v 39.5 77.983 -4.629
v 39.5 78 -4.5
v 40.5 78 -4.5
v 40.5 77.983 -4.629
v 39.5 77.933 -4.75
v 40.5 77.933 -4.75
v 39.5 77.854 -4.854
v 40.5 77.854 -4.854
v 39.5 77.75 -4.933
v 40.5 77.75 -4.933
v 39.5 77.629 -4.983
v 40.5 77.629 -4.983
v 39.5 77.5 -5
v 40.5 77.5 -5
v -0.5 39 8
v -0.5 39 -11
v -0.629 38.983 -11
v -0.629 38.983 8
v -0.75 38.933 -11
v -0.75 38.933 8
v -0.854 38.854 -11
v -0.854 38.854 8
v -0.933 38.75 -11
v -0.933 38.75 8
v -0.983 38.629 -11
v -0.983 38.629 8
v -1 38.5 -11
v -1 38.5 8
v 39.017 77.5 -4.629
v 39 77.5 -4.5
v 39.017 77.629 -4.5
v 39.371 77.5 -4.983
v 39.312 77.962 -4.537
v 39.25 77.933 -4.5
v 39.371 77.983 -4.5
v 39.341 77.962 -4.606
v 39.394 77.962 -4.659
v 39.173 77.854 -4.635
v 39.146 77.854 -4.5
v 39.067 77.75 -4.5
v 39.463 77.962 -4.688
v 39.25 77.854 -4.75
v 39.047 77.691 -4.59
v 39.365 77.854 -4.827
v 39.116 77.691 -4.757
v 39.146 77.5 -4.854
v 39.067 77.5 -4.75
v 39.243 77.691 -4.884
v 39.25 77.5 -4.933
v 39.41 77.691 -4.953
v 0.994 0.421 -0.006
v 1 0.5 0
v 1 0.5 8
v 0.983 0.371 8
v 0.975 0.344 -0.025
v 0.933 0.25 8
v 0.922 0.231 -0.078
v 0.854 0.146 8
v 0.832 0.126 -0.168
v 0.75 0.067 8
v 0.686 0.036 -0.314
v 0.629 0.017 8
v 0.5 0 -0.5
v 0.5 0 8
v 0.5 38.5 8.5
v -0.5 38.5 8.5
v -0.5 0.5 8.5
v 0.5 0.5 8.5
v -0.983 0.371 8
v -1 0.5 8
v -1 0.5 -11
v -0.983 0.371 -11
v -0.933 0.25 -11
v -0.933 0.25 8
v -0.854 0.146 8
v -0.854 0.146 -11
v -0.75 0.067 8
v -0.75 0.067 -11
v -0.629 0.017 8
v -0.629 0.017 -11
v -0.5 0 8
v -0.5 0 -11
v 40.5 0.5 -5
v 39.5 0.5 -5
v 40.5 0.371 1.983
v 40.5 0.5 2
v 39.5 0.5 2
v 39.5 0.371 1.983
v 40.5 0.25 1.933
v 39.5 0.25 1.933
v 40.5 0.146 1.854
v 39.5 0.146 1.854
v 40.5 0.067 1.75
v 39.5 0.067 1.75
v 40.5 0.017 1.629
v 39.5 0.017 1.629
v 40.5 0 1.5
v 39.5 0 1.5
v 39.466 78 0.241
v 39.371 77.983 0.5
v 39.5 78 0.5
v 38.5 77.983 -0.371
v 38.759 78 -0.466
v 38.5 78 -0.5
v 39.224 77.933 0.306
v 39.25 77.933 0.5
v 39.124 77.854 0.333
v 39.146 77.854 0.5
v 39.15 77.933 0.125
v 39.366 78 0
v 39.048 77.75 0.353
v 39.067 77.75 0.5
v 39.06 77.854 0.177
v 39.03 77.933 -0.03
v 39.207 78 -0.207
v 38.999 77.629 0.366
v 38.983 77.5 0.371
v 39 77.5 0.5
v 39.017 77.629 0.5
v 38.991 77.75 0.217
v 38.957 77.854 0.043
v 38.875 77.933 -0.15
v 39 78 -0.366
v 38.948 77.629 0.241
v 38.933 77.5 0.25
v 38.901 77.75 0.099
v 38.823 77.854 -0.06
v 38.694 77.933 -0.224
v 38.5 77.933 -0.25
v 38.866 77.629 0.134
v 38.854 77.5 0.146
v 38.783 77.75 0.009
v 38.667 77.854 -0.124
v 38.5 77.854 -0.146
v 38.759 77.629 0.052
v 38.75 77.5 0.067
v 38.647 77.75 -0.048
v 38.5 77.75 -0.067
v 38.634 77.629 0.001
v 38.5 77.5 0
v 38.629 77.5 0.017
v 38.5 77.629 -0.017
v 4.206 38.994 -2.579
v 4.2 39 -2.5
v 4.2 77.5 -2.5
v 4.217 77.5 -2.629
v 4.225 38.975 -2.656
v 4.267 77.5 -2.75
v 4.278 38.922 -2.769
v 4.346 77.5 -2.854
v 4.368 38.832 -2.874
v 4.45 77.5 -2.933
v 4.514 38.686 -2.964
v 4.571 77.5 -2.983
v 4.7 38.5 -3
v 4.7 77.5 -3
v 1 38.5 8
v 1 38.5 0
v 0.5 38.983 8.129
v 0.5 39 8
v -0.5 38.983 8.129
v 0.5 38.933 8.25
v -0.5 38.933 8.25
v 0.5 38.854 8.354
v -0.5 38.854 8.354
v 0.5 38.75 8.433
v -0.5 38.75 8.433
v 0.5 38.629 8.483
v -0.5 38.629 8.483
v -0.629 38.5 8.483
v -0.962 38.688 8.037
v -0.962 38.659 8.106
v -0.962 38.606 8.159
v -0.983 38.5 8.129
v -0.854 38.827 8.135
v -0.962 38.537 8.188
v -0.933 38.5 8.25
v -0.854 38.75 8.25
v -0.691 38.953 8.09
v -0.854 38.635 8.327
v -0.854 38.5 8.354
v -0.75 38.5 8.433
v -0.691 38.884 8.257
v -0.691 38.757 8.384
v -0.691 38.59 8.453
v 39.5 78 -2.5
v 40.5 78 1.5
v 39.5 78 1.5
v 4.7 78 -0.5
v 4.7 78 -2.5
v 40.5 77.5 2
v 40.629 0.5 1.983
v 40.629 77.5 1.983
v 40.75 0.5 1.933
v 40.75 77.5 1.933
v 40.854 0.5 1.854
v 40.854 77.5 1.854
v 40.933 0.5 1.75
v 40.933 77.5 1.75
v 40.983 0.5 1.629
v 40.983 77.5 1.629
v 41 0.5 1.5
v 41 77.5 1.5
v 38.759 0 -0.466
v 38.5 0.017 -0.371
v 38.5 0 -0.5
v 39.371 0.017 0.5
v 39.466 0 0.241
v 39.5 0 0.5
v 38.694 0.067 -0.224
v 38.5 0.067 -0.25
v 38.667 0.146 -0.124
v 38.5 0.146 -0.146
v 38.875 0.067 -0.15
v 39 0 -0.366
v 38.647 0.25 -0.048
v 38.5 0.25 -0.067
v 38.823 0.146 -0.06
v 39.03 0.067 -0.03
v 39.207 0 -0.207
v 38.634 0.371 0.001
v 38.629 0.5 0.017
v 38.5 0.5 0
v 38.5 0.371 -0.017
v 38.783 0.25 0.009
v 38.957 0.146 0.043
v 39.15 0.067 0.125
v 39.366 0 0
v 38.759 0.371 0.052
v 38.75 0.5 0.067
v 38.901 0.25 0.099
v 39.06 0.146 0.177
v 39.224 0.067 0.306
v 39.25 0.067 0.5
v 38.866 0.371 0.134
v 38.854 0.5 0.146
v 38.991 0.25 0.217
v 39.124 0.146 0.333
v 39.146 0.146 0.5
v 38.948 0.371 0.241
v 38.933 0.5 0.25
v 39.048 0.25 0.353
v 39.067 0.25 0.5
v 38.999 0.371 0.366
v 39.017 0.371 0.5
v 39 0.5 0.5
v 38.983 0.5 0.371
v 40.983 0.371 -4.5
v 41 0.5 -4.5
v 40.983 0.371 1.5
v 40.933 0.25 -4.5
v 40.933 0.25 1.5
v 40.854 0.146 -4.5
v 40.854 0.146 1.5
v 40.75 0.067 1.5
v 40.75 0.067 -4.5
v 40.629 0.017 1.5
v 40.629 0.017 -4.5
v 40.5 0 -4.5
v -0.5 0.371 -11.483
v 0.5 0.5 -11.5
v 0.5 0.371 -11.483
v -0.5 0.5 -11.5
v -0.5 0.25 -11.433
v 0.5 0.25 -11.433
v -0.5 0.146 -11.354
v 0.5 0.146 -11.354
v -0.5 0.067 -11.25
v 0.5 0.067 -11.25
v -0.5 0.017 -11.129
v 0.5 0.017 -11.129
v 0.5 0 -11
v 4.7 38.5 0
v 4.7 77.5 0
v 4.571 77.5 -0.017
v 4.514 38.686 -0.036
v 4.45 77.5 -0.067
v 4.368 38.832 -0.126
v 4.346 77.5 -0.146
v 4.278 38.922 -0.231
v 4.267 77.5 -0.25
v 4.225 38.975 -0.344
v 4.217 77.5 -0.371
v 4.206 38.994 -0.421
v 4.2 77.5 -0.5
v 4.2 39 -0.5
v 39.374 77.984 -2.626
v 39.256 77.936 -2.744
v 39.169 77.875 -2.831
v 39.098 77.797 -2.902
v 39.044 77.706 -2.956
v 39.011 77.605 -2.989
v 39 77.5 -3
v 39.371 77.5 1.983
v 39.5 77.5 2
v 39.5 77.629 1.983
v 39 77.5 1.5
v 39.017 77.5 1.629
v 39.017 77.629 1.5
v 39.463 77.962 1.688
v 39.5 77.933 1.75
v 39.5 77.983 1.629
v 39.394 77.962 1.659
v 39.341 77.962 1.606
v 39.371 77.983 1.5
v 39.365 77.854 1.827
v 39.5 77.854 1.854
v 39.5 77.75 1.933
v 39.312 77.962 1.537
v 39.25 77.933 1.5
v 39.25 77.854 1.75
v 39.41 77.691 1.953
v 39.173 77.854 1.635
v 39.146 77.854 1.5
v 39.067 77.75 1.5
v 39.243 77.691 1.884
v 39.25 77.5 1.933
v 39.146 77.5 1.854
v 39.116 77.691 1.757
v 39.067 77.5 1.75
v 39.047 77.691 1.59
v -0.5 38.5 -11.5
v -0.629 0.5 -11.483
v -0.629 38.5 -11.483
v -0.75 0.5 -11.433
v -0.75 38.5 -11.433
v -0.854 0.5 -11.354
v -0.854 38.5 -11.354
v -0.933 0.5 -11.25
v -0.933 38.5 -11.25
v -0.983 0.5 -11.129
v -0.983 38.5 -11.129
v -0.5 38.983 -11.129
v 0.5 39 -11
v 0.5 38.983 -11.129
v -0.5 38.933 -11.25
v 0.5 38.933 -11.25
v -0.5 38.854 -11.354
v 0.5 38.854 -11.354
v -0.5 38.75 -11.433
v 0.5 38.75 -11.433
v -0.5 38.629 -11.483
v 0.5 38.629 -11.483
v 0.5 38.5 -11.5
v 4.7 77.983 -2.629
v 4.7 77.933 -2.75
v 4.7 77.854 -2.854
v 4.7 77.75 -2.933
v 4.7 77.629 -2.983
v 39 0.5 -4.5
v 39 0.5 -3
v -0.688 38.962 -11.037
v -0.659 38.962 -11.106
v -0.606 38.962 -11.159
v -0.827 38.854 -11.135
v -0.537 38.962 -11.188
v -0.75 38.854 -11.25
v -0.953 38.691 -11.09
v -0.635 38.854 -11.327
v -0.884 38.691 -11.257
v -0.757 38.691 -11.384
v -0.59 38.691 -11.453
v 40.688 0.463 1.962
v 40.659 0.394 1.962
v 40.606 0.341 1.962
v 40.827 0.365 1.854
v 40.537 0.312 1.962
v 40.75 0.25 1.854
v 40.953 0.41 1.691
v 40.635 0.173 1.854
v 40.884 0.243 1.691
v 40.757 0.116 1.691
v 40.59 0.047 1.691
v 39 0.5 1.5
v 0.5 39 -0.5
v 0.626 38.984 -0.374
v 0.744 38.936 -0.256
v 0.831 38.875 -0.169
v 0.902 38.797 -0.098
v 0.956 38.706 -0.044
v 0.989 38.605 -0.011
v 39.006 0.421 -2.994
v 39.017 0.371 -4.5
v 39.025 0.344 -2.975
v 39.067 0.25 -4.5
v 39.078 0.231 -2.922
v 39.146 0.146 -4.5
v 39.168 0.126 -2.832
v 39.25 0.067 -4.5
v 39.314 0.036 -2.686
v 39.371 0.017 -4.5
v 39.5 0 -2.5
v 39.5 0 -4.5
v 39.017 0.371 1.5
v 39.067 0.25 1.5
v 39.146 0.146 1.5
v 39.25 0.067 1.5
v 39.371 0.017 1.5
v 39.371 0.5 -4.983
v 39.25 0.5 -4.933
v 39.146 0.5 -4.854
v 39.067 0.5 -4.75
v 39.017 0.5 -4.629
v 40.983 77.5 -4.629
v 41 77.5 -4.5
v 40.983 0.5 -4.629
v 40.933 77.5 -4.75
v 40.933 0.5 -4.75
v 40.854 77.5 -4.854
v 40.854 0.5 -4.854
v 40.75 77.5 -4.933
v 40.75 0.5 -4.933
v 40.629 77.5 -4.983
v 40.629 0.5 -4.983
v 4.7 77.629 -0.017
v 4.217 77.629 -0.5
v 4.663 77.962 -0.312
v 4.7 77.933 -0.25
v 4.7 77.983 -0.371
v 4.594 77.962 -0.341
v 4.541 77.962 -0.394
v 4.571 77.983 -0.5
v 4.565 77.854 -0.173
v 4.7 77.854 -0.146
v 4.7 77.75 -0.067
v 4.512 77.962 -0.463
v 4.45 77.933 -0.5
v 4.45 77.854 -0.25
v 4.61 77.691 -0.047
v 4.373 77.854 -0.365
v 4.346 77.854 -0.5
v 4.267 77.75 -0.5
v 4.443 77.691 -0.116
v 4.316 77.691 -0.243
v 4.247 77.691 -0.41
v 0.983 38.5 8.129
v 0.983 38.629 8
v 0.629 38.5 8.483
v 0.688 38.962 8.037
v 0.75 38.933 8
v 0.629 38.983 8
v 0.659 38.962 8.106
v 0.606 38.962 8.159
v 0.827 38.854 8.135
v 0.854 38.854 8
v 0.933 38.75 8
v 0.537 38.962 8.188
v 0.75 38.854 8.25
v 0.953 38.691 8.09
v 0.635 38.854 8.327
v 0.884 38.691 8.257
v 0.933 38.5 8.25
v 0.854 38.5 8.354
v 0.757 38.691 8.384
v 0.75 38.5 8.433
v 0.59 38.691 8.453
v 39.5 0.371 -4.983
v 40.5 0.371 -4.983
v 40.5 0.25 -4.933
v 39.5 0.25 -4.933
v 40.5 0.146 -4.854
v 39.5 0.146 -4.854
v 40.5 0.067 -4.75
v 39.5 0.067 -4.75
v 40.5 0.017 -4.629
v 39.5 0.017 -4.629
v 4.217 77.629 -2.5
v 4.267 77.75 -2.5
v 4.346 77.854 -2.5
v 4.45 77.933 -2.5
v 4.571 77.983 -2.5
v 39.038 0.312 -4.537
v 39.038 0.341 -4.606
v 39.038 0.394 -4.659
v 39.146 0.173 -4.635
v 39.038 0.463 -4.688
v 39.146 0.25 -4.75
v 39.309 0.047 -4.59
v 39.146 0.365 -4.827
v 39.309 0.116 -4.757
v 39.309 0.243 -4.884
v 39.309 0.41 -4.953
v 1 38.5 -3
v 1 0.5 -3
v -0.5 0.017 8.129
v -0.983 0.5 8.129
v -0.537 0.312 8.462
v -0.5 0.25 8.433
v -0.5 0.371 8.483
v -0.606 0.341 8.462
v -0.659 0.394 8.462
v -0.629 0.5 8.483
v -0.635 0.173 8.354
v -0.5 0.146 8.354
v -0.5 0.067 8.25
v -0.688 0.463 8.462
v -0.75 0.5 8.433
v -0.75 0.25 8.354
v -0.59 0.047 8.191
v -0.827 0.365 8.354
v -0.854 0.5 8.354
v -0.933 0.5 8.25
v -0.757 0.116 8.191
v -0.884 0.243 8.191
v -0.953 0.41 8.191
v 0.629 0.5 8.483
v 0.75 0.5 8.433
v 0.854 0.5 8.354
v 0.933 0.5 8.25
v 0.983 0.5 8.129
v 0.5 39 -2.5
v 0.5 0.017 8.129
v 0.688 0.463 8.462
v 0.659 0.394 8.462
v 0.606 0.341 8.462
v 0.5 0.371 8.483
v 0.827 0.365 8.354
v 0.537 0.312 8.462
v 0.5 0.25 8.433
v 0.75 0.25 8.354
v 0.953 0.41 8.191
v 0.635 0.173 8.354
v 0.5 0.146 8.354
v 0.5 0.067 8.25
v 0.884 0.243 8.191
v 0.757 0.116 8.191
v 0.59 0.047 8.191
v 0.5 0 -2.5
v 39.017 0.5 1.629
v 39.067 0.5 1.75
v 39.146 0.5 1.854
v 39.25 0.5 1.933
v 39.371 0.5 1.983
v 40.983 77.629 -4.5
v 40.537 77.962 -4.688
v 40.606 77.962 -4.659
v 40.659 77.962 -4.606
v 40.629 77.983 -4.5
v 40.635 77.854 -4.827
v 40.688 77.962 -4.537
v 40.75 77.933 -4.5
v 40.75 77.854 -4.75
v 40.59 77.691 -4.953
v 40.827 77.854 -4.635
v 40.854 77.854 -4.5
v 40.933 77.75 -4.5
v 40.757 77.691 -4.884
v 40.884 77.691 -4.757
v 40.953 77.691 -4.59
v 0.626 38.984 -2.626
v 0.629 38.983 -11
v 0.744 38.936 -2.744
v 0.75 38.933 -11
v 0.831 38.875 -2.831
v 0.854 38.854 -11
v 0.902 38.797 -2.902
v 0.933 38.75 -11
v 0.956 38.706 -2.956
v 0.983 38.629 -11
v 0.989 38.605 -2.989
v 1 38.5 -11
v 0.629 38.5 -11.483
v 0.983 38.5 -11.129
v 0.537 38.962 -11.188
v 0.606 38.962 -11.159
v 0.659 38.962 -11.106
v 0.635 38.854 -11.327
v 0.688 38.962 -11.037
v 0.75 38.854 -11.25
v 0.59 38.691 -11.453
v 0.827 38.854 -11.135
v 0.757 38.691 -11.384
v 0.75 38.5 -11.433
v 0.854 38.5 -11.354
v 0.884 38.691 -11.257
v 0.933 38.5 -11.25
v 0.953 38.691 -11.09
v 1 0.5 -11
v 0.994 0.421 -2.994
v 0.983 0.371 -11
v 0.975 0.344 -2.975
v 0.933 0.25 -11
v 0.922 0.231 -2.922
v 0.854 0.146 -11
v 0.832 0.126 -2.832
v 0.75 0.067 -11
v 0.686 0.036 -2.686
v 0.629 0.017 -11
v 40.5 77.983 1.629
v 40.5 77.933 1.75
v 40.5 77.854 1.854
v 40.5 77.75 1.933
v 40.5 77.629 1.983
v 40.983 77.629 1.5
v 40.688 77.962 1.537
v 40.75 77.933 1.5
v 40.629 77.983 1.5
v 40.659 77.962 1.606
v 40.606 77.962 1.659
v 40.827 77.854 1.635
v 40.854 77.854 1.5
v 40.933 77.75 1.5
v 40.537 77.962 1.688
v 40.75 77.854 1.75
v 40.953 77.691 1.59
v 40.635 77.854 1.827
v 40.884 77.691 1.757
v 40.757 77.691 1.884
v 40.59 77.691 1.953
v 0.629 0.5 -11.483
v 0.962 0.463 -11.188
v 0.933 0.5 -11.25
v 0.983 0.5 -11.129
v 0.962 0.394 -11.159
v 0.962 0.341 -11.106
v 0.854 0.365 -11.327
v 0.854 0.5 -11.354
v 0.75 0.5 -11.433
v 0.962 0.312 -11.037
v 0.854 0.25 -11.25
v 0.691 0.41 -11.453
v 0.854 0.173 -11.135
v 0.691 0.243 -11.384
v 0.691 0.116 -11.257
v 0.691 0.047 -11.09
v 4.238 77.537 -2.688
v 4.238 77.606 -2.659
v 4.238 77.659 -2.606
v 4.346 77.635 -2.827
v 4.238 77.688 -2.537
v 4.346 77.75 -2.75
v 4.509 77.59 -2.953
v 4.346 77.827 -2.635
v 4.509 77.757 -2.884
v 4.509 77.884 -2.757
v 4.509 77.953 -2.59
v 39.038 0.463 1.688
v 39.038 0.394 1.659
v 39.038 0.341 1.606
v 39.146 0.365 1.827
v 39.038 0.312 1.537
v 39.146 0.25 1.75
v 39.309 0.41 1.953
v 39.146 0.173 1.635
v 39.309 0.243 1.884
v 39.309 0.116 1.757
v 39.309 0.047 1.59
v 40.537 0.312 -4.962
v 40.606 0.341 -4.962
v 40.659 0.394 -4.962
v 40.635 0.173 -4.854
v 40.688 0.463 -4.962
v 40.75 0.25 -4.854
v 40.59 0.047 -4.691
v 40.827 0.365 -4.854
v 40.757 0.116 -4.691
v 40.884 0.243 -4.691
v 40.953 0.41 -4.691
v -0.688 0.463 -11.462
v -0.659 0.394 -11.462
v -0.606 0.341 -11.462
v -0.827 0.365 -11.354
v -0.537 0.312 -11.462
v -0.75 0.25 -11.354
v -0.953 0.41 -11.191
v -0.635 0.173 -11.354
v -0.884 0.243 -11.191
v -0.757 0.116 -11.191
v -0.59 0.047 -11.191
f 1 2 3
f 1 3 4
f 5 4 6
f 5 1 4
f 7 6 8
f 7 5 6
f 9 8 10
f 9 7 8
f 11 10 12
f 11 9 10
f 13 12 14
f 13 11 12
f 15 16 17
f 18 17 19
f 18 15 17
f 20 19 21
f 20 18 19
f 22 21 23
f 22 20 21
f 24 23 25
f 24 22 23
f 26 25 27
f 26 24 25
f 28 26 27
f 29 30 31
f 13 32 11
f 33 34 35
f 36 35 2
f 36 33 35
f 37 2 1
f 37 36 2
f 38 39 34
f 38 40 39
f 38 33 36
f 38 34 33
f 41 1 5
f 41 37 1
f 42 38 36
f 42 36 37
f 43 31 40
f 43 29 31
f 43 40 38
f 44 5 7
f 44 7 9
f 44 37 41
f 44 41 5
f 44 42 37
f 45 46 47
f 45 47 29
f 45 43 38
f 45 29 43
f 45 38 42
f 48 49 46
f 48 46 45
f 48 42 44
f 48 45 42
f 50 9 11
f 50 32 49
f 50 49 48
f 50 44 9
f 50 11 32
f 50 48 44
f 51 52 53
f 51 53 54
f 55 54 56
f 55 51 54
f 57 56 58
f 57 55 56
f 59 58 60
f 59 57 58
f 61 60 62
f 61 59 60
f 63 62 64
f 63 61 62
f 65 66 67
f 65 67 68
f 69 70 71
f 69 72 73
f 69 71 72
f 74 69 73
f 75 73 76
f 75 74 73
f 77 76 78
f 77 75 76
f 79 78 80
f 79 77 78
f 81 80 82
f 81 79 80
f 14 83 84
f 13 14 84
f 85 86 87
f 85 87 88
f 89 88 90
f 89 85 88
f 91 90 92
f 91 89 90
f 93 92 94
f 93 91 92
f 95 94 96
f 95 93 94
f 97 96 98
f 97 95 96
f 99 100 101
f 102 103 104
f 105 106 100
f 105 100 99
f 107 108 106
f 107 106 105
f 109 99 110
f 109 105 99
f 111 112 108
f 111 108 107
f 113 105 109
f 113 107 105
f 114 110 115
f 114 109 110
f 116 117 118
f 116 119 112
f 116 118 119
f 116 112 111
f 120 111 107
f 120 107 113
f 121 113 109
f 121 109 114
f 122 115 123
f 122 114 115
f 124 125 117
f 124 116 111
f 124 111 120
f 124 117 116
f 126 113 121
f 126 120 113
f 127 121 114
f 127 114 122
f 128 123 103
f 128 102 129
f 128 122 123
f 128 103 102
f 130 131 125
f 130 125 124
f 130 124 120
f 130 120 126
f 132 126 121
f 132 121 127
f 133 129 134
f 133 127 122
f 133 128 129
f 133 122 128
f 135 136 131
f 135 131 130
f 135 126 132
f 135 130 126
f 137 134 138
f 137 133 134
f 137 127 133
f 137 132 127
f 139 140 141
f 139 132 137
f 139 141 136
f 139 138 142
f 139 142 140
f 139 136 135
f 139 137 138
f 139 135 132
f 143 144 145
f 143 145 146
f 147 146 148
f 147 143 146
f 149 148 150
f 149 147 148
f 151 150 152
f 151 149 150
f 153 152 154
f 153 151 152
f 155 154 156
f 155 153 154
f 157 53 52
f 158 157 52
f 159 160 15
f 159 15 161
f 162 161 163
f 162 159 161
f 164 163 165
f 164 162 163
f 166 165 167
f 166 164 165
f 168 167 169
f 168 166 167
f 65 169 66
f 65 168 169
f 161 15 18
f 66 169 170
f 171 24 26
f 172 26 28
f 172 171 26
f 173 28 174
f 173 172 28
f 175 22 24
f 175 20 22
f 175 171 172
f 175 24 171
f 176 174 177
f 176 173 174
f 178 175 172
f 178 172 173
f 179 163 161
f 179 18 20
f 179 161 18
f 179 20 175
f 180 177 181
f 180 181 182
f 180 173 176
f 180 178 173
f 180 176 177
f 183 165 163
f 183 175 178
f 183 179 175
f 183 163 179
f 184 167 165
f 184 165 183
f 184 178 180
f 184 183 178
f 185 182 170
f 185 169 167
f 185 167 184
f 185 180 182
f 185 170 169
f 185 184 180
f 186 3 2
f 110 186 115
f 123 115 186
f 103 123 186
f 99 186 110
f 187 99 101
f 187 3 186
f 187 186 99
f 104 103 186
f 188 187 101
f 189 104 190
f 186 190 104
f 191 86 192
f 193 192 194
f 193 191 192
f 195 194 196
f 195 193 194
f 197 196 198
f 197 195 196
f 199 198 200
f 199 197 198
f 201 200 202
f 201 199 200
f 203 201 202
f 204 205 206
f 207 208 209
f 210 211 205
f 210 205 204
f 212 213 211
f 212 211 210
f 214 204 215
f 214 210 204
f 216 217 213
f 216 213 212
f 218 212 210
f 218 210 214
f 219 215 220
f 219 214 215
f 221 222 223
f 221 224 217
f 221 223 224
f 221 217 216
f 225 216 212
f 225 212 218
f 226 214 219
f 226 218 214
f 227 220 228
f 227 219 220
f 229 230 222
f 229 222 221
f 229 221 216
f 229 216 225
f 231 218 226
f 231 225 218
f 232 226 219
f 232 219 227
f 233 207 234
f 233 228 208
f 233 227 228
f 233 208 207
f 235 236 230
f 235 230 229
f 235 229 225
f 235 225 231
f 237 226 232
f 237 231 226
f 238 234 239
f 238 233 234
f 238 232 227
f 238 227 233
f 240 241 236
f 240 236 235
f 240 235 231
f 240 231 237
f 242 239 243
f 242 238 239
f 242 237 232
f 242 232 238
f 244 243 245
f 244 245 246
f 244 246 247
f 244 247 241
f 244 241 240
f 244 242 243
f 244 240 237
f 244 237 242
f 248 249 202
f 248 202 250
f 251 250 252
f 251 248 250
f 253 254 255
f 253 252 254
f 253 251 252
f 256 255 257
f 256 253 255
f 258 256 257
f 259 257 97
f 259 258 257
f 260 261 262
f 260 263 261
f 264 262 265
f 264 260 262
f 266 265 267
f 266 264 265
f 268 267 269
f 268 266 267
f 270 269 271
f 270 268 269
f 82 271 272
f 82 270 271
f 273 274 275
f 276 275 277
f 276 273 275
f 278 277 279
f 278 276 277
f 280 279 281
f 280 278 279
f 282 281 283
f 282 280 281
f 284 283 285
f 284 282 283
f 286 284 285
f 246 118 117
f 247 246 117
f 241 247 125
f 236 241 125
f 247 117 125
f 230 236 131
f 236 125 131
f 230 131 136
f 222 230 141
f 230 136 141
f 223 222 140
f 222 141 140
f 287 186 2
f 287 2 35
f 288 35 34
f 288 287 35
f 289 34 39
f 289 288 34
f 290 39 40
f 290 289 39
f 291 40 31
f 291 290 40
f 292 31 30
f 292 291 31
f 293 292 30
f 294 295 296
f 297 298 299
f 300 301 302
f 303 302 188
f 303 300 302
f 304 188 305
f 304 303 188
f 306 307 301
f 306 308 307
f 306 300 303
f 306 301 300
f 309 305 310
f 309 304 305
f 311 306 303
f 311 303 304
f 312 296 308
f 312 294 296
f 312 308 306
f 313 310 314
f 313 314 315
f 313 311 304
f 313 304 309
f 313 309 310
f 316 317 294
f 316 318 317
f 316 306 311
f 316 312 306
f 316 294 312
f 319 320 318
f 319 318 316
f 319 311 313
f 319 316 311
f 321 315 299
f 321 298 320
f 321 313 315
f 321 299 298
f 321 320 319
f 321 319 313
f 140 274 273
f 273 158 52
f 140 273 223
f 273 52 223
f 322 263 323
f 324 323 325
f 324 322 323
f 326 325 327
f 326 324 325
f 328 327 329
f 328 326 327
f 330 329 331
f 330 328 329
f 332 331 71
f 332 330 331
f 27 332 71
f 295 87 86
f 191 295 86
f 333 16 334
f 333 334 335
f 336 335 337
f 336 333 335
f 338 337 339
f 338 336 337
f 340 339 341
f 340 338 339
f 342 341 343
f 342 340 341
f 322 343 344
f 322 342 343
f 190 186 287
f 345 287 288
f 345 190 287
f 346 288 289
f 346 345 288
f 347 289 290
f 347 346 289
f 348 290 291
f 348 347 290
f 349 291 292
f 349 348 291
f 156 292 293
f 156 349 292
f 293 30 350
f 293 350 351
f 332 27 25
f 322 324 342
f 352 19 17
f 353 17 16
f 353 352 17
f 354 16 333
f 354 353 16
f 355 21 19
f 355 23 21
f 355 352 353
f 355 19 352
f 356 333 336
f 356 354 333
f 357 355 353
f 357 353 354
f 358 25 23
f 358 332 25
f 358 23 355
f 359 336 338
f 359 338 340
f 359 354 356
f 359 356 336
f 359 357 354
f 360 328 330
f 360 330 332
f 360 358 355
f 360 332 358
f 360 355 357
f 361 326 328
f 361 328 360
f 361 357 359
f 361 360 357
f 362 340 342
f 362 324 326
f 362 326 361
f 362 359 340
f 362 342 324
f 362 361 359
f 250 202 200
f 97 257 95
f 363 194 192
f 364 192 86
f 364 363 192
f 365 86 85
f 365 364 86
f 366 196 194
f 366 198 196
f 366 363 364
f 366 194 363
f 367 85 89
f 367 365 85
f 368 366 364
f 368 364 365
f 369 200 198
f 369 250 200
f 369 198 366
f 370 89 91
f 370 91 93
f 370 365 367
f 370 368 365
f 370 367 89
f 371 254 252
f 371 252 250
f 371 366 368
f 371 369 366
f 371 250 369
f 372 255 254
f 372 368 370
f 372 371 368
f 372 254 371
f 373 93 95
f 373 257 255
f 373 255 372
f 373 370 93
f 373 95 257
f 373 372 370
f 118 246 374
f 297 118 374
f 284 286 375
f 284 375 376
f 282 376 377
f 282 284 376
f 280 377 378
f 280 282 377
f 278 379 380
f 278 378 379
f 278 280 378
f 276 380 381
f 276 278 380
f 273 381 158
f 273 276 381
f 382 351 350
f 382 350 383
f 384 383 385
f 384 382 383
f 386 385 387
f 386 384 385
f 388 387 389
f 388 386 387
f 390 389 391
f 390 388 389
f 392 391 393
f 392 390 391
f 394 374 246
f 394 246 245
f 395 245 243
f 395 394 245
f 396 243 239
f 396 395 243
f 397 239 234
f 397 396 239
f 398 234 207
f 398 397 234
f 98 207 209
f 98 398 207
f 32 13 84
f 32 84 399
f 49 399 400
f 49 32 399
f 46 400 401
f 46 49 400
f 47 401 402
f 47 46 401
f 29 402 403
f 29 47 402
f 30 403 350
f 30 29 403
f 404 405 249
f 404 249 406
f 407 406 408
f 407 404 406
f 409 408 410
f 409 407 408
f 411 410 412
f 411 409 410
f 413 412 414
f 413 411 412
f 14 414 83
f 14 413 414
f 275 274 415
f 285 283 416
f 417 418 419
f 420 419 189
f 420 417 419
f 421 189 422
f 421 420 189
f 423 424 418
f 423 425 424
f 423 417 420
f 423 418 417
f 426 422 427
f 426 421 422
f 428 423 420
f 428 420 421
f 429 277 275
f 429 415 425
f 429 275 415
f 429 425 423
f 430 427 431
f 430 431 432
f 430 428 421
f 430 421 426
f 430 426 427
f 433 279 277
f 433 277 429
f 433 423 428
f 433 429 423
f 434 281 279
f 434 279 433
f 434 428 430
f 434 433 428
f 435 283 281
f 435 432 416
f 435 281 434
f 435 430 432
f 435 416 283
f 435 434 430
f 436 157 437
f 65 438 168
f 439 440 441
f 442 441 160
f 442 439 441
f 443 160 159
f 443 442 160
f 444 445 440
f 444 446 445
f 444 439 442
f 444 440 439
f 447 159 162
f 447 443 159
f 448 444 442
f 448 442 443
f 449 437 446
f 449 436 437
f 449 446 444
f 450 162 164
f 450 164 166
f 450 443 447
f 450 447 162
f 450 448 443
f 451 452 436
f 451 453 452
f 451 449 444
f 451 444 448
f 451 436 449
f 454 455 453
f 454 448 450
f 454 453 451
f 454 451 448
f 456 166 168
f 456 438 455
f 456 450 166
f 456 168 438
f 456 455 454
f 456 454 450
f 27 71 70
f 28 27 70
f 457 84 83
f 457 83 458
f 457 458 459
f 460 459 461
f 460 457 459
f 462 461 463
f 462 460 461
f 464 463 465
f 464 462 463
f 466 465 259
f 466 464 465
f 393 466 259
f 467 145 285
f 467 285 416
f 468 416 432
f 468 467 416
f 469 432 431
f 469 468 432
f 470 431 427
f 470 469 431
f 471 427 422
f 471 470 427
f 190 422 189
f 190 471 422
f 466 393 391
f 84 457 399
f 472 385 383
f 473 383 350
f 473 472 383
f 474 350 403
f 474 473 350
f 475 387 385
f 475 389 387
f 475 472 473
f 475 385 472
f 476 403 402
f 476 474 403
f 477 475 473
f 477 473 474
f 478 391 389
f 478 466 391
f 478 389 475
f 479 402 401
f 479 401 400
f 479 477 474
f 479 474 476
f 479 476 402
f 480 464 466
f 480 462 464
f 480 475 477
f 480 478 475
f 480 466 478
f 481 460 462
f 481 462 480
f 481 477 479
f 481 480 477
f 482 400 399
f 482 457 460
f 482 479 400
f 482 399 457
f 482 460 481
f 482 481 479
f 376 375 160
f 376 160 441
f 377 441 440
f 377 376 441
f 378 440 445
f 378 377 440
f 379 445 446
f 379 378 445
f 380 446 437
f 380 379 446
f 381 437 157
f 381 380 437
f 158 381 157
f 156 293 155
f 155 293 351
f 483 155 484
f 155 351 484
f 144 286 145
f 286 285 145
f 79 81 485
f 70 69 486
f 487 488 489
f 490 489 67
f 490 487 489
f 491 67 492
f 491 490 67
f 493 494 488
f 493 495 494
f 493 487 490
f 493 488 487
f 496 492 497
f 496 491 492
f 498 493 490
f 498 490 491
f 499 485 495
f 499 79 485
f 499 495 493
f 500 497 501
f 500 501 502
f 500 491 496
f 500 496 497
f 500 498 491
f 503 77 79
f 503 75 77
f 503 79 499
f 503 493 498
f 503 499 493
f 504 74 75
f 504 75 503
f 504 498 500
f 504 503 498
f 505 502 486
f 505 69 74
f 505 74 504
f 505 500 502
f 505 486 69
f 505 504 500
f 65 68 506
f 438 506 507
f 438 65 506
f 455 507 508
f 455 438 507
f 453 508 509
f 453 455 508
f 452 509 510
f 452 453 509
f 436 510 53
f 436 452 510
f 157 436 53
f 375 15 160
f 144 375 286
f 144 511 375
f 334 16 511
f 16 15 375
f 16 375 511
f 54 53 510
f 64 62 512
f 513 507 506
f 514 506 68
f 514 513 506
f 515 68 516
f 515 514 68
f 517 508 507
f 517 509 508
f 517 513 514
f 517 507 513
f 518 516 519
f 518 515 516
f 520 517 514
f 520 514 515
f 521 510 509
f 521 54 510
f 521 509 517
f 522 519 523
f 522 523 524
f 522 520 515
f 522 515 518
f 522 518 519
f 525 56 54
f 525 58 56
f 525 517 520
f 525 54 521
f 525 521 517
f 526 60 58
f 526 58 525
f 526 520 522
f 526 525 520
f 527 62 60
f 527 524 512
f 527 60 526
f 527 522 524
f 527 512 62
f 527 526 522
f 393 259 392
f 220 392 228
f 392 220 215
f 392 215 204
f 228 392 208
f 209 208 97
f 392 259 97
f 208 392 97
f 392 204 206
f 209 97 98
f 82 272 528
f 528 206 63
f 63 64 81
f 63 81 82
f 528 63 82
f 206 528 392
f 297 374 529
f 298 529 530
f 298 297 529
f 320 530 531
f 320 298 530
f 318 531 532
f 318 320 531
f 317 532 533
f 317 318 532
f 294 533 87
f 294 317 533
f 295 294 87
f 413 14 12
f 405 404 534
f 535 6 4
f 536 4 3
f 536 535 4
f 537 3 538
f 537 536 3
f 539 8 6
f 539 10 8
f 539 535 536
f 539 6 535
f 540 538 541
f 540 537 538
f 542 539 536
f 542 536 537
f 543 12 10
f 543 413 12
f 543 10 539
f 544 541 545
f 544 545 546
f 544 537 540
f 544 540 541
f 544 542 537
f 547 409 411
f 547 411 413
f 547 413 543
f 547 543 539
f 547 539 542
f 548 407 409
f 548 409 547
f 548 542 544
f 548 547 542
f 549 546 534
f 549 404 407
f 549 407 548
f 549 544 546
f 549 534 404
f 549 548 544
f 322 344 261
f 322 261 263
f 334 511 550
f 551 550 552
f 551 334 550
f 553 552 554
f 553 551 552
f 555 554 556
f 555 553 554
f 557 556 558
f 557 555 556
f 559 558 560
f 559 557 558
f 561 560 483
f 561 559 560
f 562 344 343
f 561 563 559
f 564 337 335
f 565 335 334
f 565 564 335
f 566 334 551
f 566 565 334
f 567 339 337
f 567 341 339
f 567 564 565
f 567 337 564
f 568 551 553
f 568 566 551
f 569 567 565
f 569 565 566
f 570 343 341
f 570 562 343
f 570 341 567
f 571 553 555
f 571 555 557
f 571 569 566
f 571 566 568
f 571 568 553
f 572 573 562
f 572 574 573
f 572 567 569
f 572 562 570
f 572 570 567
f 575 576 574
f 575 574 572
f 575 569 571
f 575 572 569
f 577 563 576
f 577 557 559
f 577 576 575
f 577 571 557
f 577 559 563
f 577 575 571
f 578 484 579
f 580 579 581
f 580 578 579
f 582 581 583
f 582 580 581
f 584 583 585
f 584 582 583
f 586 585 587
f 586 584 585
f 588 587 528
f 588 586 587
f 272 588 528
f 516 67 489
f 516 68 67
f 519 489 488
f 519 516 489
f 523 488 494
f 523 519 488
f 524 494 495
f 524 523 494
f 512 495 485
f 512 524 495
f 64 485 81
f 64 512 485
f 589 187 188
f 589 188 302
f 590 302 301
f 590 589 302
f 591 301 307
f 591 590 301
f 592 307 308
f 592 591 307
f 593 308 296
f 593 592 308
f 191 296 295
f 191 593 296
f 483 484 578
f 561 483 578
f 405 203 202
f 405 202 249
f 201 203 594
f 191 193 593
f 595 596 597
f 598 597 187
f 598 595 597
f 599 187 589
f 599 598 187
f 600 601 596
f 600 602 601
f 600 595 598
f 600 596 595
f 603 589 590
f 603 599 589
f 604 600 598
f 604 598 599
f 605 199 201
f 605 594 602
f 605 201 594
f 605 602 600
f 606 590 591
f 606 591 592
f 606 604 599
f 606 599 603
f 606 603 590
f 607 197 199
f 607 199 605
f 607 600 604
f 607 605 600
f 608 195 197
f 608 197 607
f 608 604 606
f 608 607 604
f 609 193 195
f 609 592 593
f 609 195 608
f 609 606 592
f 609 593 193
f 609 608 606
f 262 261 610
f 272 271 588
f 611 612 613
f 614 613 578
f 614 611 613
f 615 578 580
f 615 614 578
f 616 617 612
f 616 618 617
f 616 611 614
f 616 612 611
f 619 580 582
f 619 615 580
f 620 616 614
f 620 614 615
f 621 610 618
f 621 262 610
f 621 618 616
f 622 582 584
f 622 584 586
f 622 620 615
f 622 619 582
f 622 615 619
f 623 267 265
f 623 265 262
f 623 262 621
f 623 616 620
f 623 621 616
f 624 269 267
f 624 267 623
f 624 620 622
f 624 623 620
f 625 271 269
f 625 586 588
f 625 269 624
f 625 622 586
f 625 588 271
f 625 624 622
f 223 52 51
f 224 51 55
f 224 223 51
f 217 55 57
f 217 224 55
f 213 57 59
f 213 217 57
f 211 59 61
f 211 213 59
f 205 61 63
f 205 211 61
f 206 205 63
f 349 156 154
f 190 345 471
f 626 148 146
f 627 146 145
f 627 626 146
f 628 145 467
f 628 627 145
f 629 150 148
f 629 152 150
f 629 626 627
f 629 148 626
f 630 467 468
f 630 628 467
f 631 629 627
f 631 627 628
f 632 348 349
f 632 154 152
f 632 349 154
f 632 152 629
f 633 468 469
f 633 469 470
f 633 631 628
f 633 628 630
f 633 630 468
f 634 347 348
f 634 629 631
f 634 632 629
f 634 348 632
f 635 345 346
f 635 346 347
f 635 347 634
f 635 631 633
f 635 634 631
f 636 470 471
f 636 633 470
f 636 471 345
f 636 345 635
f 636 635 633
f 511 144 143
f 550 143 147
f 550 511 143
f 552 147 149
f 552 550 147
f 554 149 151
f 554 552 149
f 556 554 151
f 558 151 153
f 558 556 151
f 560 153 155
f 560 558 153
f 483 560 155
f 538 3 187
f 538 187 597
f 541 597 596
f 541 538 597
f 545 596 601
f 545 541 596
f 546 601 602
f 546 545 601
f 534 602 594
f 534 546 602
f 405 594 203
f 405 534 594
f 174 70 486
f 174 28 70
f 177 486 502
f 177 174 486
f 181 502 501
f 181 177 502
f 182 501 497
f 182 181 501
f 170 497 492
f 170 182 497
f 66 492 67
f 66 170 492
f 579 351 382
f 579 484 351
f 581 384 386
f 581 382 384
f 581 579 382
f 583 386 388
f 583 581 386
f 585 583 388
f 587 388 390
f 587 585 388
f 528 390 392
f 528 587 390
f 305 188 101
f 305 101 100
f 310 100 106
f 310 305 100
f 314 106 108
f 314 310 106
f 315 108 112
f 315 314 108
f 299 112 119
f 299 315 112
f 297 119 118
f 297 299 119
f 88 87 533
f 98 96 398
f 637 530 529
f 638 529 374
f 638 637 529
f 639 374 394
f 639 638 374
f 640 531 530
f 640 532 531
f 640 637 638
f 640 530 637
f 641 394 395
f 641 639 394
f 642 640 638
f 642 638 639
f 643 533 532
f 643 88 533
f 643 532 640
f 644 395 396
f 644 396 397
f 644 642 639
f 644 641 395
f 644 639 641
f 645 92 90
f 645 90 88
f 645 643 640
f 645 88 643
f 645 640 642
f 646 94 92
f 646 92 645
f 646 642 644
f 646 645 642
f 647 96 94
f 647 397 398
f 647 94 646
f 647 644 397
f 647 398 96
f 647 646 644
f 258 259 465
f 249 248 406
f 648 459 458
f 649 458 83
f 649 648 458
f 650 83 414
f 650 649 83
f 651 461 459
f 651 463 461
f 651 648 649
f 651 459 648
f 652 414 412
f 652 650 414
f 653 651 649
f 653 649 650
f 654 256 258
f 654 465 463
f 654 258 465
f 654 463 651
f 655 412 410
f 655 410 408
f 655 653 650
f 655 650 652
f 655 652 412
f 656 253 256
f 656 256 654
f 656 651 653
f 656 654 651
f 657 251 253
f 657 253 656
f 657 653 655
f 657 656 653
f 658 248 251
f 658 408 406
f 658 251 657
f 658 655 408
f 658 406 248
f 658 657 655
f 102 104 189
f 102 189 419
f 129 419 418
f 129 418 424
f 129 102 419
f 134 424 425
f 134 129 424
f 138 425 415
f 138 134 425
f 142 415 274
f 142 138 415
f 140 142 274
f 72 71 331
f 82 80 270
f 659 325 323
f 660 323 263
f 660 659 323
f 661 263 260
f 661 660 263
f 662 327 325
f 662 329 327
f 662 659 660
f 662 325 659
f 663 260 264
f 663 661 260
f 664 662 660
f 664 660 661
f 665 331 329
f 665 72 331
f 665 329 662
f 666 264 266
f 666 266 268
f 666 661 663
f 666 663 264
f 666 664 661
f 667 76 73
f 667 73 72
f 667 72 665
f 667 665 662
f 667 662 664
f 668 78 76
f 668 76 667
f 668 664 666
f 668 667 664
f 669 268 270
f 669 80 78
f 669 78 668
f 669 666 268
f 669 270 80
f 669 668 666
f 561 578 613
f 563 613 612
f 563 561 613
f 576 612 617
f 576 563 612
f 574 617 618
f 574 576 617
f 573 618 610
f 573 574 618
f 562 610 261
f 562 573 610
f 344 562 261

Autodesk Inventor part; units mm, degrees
ref_plane "YZ Plane" through (0, 0, 0) normal (1, 0, 0) x (0, 1, 0)
ref_plane "XZ Plane" through (0, 0, 0) normal (0, 1, 0) x (-1, 0, 0)
ref_plane "XY Plane" through (0, 0, 0) normal (0, 0, 1) x (1, 0, 0)
sketch "スケッチ1" plane through (0, 0, 0) normal (0, 1, 0) x (-1, 0, 0)
  line L0 (0, 0) -> (-40, 0)
  line L1 (-40, 0) -> (-40, -3)
  line L2 (-40, -3) -> (0, -3)
  line L3 (0, -3) -> (0, 0)
  line L4 (-39, 2) -> (-41, 2)
  line L5 (-41, 2) -> (-41, -5)
  line L6 (-41, -5) -> (-39, -5)
  line L7 (-39, -5) -> (-39, 2)
  line L8 (-39, 2) -> (-41, -5) construction
  line L9 (-41, 2) -> (-39, -5) construction
  line L10 (1, 8.5) -> (-1, 8.5)
  line L11 (-1, 8.5) -> (-1, -11.5)
  line L12 (-1, -11.5) -> (1, -11.5)
  line L13 (1, -11.5) -> (1, 8.5)
  line L14 (1, 8.5) -> (-1, -11.5) construction
  line L15 (-1, 8.5) -> (1, -11.5) construction
  point P0 (-40, -1.5)
  point P1 (0, -1.5)
  dimension "d1" = 40
  dimension "d2" = 3
  dimension "d3" = 2
  dimension "d4" = 7
  dimension "d5" = 2
  dimension "d6" = 20
extrude "押し出し1" add sketch "スケッチ1" along normal blind 78
sketch "スケッチ2" plane through (0, 78, 0) normal (0, 1, 0) x (1, 0, 0)
  line L0 (1, 3) -> (1, 11.5) projected
  line L1 (-1, -8.5) -> (1, -8.5)
  line L2 (1, -8.5) -> (1, 11.5)
  line L3 (1, 11.5) -> (-1, 11.5)
  line L4 (-1, 11.5) -> (-1, -8.5)
  line L5 (1, 0) -> (39, 0) projected
  line L6 (1, 0) -> (4.2, 0)
  line L7 (4.2, 0) -> (4.2, 3)
  line L8 (4.2, 3) -> (1, 3)
  line L9 (1, 3) -> (1, 0)
  point P0 (0, 0)
  dimension "d9" = 2
  dimension "d10" = 20
  dimension "d11" = 3.2
  dimension "d12" = 3
extrude "押し出し2" cut sketch "スケッチ2" against normal blind 39
fillet "フィレット1" radius 0.5 38 edges at (1, 0, 4.25) (-1, 0, -1.5) (1, 19.5, 8.5) (0, 0, -11.5) (1, 0, -7.25) (20, 0, 0) (20, 0, -3) (0, 0, 8.5) (41, 0, -1.5) (40, 0, 2) (39, 39, 0) (40, 0, -5) (39, 0, 1) (39, 0, -4) (41, 39, -5) (39, 39, -5) (41, 39, 2) (41, 78, -1.5) (40, 78, -5) (21.6, 78, -3) (4.2, 58.5, 0) (2.6, 39, 0) (1, 39, 4.25) (0, 39, 8.5) (-1, 19.5, 8.5) (39, 39, 2) (21.6, 78, 0) (40, 78, 2) (39, 78, 1) (4.2, 78, -1.5) (4.2, 58.5, -3) (39, 78, -4) (-1, 19.5, -11.5) (1, 19.5, -11.5) (0, 39, -11.5) (1, 39, -7.25) (-1, 39, -1.5) (2.6, 39, -3)
properties part number "halfPartition"
